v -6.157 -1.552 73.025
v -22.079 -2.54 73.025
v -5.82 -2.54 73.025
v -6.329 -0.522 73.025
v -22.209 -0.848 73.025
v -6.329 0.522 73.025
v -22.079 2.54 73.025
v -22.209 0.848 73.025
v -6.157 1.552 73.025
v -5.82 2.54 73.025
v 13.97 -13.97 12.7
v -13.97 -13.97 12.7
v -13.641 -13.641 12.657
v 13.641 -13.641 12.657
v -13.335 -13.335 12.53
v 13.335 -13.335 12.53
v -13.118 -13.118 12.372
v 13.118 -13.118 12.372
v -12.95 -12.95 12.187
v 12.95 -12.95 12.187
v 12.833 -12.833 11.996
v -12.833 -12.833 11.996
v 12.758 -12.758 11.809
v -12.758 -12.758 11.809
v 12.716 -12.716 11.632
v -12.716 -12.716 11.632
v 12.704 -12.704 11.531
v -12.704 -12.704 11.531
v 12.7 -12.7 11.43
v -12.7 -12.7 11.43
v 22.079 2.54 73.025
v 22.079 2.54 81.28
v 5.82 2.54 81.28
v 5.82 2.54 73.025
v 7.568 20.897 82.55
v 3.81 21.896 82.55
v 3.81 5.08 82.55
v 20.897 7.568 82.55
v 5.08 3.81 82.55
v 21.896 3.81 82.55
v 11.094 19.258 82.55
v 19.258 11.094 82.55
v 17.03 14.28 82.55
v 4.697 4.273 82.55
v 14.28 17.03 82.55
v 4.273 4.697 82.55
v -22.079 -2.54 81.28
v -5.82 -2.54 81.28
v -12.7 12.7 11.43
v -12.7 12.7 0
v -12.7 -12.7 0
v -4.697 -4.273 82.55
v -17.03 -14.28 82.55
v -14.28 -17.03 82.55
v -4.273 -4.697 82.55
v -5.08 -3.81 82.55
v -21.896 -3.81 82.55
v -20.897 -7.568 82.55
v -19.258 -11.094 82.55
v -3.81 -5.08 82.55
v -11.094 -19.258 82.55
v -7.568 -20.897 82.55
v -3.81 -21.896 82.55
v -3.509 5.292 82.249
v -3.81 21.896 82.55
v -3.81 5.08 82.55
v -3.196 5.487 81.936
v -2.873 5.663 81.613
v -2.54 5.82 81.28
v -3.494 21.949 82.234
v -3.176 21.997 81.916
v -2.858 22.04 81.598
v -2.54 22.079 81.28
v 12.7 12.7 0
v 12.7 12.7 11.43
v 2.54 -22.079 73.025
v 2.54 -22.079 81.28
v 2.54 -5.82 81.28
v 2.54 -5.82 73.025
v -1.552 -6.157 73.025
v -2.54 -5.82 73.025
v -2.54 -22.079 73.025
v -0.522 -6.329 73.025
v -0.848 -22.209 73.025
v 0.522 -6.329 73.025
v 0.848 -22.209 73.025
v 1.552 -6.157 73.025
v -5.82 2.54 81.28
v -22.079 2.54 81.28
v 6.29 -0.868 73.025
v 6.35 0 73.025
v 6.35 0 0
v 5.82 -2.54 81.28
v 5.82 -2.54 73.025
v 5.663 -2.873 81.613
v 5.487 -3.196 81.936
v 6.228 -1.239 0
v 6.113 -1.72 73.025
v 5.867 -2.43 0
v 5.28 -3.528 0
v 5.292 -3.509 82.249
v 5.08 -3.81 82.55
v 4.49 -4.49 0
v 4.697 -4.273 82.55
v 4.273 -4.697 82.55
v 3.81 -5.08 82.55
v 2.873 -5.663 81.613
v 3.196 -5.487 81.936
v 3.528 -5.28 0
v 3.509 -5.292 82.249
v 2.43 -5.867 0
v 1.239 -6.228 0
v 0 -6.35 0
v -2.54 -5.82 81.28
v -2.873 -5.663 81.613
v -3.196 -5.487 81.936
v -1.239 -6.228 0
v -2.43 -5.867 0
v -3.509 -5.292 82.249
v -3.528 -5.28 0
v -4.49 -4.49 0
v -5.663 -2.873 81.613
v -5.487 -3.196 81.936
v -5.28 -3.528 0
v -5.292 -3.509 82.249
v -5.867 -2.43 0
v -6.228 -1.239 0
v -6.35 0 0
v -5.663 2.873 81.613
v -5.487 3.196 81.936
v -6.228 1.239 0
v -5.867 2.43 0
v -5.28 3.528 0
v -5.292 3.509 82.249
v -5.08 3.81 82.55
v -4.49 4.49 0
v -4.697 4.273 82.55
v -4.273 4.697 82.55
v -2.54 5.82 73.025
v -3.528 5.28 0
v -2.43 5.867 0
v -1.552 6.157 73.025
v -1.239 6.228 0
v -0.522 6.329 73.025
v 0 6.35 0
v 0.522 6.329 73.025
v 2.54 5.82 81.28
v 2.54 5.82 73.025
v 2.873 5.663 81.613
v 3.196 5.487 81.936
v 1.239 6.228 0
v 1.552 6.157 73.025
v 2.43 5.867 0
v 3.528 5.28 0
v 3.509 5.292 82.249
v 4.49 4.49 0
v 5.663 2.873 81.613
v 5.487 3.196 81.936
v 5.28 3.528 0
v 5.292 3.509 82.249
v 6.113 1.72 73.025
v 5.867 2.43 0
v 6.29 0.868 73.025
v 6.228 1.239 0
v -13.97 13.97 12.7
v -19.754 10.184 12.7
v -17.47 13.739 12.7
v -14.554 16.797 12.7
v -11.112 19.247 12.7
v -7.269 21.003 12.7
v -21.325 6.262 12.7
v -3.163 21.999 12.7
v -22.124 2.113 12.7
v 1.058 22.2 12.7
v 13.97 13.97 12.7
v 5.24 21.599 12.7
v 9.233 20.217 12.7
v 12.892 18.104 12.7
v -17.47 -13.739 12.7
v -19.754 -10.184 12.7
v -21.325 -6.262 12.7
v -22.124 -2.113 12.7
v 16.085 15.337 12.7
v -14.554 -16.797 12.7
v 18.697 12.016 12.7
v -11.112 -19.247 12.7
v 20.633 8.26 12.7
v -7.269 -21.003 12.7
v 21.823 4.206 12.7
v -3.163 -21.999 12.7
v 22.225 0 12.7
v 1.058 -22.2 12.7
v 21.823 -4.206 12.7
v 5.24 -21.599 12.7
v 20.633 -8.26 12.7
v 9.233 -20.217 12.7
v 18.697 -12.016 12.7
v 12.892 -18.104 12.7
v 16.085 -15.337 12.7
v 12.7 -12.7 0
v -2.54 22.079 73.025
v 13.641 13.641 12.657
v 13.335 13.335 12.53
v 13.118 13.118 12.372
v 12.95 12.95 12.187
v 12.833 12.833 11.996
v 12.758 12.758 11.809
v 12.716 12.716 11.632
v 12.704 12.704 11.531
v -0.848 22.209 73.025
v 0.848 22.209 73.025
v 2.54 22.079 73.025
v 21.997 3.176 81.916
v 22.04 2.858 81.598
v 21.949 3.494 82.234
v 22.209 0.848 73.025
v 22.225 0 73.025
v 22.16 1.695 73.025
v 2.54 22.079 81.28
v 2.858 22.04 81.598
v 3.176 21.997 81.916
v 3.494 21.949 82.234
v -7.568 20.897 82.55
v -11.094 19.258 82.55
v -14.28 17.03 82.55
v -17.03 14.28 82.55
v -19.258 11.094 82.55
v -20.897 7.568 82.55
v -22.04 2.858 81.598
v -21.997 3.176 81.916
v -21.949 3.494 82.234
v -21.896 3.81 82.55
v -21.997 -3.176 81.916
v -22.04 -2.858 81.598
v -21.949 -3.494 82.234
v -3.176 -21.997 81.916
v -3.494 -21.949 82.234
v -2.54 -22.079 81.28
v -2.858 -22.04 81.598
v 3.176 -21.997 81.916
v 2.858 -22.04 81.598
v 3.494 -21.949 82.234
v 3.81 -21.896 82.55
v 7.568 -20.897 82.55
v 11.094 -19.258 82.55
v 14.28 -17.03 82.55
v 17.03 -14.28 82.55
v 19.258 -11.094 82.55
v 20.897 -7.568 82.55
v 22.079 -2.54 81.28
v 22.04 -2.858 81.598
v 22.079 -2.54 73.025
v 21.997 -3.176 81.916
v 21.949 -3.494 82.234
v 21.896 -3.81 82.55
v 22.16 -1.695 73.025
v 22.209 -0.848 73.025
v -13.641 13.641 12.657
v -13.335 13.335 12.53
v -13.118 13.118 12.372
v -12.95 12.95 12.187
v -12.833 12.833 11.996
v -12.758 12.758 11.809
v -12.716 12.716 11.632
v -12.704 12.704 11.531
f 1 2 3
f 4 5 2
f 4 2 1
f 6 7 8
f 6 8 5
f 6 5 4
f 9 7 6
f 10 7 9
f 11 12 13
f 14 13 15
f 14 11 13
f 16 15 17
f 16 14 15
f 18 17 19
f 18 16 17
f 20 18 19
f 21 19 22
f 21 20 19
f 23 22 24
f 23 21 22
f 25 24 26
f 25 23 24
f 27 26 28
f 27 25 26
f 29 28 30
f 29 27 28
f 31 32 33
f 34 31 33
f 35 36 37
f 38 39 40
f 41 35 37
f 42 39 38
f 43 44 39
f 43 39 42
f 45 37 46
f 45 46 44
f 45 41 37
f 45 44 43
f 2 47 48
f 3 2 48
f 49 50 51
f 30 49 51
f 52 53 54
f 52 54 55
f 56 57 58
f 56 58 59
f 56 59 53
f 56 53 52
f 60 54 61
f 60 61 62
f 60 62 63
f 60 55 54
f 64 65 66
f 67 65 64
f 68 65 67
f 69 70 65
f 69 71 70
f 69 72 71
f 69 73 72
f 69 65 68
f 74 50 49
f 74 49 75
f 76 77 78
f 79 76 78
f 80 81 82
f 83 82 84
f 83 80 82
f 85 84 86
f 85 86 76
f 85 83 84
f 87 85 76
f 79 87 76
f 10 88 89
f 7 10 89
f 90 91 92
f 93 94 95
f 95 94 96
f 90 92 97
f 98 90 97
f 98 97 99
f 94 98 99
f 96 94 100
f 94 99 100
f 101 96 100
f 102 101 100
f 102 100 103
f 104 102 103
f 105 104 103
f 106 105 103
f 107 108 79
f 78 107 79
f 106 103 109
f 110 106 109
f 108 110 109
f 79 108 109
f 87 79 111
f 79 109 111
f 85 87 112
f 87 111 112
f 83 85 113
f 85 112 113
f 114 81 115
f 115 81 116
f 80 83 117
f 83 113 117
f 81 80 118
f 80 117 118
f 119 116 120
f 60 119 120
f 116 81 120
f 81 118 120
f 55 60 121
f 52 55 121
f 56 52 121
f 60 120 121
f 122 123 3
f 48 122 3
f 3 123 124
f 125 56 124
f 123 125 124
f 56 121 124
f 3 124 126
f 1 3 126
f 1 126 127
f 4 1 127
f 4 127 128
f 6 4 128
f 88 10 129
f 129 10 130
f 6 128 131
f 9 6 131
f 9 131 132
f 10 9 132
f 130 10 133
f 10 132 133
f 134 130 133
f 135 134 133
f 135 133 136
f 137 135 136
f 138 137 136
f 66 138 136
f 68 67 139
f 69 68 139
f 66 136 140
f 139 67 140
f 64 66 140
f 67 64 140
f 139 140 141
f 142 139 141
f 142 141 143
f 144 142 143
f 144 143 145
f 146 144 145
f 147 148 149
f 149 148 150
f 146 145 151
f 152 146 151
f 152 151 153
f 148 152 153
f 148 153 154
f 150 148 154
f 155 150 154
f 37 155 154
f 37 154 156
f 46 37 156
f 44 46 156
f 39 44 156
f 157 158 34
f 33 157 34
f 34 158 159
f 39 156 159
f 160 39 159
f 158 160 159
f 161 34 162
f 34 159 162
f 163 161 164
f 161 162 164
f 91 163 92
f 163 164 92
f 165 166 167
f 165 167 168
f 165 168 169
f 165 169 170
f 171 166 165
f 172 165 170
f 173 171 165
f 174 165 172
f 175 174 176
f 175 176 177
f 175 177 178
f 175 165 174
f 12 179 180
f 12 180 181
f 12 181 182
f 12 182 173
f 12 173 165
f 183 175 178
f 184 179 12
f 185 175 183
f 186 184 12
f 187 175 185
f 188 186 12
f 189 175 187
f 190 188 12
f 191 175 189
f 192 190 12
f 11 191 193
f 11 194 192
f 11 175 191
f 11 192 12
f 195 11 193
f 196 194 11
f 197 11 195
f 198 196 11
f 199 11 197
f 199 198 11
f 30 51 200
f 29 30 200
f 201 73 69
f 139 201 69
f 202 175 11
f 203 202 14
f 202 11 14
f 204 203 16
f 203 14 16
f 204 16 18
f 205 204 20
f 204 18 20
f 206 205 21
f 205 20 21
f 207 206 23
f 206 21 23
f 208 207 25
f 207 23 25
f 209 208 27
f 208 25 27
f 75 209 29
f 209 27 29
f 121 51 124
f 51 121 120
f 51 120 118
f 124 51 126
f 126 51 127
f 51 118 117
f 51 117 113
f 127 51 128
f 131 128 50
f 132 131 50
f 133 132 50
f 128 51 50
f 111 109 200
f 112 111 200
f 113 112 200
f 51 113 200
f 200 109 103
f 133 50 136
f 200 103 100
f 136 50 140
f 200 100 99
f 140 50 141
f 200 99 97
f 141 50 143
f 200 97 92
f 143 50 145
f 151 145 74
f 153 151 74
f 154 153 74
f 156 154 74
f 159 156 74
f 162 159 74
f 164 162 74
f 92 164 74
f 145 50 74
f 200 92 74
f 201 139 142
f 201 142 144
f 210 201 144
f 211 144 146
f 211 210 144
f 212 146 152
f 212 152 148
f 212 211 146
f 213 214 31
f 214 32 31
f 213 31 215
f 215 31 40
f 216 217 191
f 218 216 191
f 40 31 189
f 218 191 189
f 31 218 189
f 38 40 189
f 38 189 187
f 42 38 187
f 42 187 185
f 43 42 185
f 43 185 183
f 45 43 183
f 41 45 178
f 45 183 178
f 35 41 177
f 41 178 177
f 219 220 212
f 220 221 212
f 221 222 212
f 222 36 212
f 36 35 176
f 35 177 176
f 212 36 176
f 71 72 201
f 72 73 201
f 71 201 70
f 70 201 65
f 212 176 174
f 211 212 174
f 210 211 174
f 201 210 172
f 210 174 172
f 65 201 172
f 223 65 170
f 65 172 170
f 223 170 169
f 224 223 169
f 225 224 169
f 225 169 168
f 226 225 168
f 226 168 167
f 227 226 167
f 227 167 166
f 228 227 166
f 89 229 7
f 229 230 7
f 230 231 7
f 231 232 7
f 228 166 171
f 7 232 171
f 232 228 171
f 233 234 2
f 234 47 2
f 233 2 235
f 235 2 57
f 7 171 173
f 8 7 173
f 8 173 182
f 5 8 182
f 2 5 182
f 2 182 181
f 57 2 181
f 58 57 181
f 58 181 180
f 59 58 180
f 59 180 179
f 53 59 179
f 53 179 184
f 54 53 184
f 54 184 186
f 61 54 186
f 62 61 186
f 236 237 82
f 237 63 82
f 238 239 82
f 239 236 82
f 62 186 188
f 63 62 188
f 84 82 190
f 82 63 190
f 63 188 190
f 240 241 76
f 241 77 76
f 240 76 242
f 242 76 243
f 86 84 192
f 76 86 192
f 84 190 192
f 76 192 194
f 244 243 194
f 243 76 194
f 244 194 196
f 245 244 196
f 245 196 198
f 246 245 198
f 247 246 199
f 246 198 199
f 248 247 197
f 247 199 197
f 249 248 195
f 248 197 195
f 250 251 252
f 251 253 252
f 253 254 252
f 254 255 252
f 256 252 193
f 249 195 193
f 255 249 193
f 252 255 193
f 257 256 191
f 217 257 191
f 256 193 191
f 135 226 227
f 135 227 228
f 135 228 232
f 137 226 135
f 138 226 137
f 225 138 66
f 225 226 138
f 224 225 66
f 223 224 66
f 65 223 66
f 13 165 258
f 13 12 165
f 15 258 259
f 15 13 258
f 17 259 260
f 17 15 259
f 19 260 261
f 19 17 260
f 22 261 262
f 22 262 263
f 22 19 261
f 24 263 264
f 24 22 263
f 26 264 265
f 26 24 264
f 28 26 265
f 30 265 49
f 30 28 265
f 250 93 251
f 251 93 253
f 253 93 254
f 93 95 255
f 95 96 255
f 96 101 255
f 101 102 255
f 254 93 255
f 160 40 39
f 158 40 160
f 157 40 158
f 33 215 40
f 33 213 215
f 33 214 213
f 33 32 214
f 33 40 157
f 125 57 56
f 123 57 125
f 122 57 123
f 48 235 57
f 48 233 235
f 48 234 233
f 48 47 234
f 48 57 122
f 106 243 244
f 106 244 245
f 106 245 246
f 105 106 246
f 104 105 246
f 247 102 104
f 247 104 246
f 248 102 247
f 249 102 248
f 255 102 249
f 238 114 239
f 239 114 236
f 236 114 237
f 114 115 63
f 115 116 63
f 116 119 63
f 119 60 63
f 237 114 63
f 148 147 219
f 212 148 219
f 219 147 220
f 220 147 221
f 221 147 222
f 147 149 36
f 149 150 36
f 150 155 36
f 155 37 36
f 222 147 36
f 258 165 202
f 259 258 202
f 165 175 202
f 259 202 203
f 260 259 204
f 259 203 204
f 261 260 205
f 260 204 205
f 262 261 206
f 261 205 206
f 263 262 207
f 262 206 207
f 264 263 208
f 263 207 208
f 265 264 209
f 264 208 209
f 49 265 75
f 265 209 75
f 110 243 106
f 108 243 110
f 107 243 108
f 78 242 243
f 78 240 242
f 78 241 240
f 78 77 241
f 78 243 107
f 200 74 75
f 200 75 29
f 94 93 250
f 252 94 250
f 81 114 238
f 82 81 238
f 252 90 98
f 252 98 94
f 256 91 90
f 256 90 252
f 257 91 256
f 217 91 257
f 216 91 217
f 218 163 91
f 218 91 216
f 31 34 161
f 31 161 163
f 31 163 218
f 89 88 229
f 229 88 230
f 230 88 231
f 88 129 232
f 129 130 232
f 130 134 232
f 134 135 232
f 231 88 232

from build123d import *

# Parameters (mm, degrees)
F0_R     = 22.225
F1_DEPTH = 82.55
F3_DEPTH = 9.525
F4_SIZE  = 1.27
F5_R     = 22.225
F5_W     = 25.4
F5_H     = 25.4
F6_DEPTH = 12.7
F7_R     = 1.27
F8_R     = 6.35
F9_DEPTH = 82.551


with BuildPart() as f1:
    # F0 (on Top) → F1 (new body)
    with BuildSketch(Plane.XY):
        Circle(F0_R)
    extrude(amount=F1_DEPTH)

    # F2 (on face) → F3 (cut)
    with BuildSketch(Plane.XY.offset(82.55)):
        with BuildLine():
            ThreePointArc((2.54, 22.0793800864), (0, 22.225), (-2.54, 22.0793800864))
            Line((-2.54, 22.0793800864), (-2.54, 2.54))
            Line((-2.54, 2.54), (-22.0793800864, 2.54))
            ThreePointArc((-22.0793800864, 2.54), (-22.225, 0), (-22.0793800864, -2.54))
            Line((-22.0793800864, -2.54), (-2.54, -2.54))
            Line((-2.54, -2.54), (-2.54, -22.0793800864))
            ThreePointArc((-2.54, -22.0793800864), (0, -22.225), (2.54, -22.0793800864))
            Line((2.54, -22.0793800864), (2.54, -2.54))
            Line((2.54, -2.54), (22.0793800864, -2.54))
            ThreePointArc((22.0793800864, -2.54), (22.1885651566, -1.2720854098), (22.225, 0))
            ThreePointArc((22.225, 0), (22.1885651566, 1.2720854098), (22.0793800864, 2.54))
            Line((22.0793800864, 2.54), (2.54, 2.54))
            Line((2.54, 2.54), (2.54, 22.0793800864))
        make_face()
    extrude(amount=-F3_DEPTH, mode=Mode.SUBTRACT)

    # F4
    f4_edges = [f1.edges().sort_by_distance(p)[0] for p in [
        (-12.30969, 2.54, 82.55),
        (-2.54, 12.30969, 82.55),
        (2.54, 12.30969, 82.55),
        (12.30969, 2.54, 82.55),
        (12.30969, -2.54, 82.55),
        (2.54, -12.30969, 82.55),
        (-2.54, -12.30969, 82.55),
        (-12.30969, -2.54, 82.55),
    ]]
    chamfer(f4_edges, length=F4_SIZE)

    # F5 (on face) → F6 (cut)
    with BuildSketch(Plane(origin=(0, 0, 0), x_dir=(1, 0, 0), z_dir=(0, 0, -1))):
        Circle(F5_R)
        Rectangle(F5_W, F5_H, mode=Mode.SUBTRACT)
    extrude(amount=-F6_DEPTH, mode=Mode.SUBTRACT)

    # F7
    f7_edges = [f1.edges().sort_by_distance(p)[0] for p in [
        (0, 12.7, 12.7),
        (12.7, 0, 12.7),
        (-12.7, 0, 12.7),
        (0, -12.7, 12.7),
    ]]
    fillet(f7_edges, radius=F7_R)

    # F8 (on face) → F9 (cut, through all)
    with BuildSketch(Plane(origin=(0, 0, 0), x_dir=(1, 0, 0), z_dir=(0, 0, -1))):
        Circle(F8_R)
    extrude(amount=-F9_DEPTH, mode=Mode.SUBTRACT)


solid = f1.part
